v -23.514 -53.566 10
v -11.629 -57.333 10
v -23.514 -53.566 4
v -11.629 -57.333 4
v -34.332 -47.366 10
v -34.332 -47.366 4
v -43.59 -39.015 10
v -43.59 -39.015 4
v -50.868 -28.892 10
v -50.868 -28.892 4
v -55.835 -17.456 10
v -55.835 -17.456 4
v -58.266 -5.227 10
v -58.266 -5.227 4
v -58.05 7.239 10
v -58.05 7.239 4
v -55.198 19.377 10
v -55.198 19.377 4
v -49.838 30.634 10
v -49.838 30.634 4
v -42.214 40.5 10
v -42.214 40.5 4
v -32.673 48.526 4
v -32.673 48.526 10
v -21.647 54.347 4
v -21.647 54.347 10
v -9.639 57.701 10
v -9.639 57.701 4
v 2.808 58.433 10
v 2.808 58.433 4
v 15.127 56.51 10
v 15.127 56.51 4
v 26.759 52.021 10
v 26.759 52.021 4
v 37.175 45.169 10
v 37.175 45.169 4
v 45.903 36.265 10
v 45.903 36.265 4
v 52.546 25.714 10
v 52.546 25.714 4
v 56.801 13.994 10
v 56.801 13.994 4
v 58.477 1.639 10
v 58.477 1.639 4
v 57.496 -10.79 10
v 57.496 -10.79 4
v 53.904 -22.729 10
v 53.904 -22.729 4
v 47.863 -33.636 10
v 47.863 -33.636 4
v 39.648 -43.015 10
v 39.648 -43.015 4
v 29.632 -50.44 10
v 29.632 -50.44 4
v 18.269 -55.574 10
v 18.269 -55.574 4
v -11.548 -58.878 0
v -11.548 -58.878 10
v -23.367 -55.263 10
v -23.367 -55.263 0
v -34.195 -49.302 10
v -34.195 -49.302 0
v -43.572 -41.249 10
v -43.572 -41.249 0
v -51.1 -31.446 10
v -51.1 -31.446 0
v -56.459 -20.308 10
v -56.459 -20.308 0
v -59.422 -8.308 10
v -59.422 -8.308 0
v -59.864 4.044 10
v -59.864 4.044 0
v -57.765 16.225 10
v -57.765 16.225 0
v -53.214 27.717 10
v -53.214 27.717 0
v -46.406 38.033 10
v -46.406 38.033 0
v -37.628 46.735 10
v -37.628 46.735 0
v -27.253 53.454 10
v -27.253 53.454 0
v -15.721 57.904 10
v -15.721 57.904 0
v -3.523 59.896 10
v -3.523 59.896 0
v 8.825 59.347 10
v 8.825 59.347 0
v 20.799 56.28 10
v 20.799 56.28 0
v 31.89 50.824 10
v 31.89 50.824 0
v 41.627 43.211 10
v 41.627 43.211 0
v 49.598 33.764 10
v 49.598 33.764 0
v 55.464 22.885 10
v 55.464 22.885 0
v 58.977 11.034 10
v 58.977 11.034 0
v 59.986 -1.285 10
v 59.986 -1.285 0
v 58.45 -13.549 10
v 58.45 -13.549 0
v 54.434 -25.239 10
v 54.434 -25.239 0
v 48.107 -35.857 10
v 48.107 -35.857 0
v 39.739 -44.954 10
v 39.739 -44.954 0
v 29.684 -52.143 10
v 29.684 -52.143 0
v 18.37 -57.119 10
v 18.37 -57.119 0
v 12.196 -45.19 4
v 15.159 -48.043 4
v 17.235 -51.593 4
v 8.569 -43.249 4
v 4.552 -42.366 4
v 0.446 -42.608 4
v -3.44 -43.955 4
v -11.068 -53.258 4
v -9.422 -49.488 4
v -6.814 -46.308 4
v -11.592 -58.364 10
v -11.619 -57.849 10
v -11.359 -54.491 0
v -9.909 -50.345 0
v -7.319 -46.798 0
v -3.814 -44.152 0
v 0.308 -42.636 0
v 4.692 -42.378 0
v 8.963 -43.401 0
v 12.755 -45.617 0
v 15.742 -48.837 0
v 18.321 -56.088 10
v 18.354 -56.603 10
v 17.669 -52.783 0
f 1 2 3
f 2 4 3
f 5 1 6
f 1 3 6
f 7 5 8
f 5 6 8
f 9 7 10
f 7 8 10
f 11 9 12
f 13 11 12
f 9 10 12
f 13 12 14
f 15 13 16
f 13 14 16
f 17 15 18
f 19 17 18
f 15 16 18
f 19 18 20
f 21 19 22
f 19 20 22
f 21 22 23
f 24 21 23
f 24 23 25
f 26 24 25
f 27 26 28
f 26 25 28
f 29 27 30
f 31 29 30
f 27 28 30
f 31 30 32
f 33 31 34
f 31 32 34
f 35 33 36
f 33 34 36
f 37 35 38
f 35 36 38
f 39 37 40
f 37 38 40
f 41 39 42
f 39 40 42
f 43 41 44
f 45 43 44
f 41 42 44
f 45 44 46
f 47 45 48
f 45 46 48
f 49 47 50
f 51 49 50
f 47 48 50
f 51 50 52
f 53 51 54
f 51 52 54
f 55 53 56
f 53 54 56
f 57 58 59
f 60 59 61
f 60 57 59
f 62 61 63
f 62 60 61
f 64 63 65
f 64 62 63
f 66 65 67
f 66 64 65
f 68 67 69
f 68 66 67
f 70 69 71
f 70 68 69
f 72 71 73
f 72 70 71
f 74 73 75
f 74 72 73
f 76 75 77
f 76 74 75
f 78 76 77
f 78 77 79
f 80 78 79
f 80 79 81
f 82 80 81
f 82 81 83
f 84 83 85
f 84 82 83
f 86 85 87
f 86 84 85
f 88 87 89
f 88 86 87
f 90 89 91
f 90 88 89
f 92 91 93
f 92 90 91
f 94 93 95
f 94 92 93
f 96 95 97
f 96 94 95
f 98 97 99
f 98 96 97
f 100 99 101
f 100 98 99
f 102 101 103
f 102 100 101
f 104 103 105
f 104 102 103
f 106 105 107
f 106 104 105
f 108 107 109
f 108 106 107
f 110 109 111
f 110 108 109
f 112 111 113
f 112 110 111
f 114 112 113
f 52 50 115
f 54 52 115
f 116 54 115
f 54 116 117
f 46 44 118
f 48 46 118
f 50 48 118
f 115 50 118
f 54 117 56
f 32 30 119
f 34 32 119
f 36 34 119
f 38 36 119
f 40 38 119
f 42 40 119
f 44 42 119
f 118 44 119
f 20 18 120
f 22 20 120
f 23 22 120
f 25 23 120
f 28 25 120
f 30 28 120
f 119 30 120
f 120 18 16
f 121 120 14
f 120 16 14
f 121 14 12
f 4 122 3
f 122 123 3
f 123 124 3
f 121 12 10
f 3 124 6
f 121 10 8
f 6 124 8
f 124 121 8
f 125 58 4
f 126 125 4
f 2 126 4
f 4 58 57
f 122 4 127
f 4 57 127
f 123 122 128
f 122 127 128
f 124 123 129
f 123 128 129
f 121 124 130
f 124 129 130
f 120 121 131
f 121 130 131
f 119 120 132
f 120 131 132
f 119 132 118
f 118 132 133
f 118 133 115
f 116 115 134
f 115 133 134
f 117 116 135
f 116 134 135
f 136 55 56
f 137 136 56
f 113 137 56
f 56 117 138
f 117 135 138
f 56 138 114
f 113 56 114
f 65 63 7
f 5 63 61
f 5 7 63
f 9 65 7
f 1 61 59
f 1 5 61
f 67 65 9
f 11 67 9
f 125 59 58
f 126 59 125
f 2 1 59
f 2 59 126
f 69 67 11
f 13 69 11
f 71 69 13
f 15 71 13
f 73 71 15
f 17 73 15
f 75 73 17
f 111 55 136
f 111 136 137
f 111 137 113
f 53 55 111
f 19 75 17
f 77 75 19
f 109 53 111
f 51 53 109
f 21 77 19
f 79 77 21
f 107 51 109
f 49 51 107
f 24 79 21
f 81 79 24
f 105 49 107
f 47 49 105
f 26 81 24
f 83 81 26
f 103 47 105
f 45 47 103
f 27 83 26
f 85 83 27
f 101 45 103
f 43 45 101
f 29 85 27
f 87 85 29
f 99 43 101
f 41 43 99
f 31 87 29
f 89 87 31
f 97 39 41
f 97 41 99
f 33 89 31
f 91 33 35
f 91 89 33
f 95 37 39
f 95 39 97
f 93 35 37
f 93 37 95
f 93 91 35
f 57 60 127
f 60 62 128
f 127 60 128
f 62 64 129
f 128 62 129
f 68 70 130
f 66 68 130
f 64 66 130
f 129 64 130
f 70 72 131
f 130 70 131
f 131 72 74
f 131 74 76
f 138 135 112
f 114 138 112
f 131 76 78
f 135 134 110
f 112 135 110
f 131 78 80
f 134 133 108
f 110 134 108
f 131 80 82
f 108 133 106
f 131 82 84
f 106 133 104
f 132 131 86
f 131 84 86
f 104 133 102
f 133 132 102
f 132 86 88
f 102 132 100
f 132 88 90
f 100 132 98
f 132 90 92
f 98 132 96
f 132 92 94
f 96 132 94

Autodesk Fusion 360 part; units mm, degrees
sketch "Sketch1" plane through (0, 0, 0) normal (0, 0, 1) x (1, 0, 0)
  circle A0 centre (0, 0) radius 77.5
  dimension "d1" = 155
sketch "Sketch2" plane through (0, 0, 0) normal (0, 0, 1) x (1, 0, 0)
  circle A0 centre (0, 0) radius 60
  dimension "d4" = 120
extrude "Extrude2" add sketch "Sketch2" along normal blind 10
hole "Hole1" at (3.3713, -57.3197, 10) direction (0, 0, -1) diameter 30 end through all
hole "Hole2" at (0, 0, 10) direction (0, 0, -1) diameter 117 depth 6 tip angle 180
